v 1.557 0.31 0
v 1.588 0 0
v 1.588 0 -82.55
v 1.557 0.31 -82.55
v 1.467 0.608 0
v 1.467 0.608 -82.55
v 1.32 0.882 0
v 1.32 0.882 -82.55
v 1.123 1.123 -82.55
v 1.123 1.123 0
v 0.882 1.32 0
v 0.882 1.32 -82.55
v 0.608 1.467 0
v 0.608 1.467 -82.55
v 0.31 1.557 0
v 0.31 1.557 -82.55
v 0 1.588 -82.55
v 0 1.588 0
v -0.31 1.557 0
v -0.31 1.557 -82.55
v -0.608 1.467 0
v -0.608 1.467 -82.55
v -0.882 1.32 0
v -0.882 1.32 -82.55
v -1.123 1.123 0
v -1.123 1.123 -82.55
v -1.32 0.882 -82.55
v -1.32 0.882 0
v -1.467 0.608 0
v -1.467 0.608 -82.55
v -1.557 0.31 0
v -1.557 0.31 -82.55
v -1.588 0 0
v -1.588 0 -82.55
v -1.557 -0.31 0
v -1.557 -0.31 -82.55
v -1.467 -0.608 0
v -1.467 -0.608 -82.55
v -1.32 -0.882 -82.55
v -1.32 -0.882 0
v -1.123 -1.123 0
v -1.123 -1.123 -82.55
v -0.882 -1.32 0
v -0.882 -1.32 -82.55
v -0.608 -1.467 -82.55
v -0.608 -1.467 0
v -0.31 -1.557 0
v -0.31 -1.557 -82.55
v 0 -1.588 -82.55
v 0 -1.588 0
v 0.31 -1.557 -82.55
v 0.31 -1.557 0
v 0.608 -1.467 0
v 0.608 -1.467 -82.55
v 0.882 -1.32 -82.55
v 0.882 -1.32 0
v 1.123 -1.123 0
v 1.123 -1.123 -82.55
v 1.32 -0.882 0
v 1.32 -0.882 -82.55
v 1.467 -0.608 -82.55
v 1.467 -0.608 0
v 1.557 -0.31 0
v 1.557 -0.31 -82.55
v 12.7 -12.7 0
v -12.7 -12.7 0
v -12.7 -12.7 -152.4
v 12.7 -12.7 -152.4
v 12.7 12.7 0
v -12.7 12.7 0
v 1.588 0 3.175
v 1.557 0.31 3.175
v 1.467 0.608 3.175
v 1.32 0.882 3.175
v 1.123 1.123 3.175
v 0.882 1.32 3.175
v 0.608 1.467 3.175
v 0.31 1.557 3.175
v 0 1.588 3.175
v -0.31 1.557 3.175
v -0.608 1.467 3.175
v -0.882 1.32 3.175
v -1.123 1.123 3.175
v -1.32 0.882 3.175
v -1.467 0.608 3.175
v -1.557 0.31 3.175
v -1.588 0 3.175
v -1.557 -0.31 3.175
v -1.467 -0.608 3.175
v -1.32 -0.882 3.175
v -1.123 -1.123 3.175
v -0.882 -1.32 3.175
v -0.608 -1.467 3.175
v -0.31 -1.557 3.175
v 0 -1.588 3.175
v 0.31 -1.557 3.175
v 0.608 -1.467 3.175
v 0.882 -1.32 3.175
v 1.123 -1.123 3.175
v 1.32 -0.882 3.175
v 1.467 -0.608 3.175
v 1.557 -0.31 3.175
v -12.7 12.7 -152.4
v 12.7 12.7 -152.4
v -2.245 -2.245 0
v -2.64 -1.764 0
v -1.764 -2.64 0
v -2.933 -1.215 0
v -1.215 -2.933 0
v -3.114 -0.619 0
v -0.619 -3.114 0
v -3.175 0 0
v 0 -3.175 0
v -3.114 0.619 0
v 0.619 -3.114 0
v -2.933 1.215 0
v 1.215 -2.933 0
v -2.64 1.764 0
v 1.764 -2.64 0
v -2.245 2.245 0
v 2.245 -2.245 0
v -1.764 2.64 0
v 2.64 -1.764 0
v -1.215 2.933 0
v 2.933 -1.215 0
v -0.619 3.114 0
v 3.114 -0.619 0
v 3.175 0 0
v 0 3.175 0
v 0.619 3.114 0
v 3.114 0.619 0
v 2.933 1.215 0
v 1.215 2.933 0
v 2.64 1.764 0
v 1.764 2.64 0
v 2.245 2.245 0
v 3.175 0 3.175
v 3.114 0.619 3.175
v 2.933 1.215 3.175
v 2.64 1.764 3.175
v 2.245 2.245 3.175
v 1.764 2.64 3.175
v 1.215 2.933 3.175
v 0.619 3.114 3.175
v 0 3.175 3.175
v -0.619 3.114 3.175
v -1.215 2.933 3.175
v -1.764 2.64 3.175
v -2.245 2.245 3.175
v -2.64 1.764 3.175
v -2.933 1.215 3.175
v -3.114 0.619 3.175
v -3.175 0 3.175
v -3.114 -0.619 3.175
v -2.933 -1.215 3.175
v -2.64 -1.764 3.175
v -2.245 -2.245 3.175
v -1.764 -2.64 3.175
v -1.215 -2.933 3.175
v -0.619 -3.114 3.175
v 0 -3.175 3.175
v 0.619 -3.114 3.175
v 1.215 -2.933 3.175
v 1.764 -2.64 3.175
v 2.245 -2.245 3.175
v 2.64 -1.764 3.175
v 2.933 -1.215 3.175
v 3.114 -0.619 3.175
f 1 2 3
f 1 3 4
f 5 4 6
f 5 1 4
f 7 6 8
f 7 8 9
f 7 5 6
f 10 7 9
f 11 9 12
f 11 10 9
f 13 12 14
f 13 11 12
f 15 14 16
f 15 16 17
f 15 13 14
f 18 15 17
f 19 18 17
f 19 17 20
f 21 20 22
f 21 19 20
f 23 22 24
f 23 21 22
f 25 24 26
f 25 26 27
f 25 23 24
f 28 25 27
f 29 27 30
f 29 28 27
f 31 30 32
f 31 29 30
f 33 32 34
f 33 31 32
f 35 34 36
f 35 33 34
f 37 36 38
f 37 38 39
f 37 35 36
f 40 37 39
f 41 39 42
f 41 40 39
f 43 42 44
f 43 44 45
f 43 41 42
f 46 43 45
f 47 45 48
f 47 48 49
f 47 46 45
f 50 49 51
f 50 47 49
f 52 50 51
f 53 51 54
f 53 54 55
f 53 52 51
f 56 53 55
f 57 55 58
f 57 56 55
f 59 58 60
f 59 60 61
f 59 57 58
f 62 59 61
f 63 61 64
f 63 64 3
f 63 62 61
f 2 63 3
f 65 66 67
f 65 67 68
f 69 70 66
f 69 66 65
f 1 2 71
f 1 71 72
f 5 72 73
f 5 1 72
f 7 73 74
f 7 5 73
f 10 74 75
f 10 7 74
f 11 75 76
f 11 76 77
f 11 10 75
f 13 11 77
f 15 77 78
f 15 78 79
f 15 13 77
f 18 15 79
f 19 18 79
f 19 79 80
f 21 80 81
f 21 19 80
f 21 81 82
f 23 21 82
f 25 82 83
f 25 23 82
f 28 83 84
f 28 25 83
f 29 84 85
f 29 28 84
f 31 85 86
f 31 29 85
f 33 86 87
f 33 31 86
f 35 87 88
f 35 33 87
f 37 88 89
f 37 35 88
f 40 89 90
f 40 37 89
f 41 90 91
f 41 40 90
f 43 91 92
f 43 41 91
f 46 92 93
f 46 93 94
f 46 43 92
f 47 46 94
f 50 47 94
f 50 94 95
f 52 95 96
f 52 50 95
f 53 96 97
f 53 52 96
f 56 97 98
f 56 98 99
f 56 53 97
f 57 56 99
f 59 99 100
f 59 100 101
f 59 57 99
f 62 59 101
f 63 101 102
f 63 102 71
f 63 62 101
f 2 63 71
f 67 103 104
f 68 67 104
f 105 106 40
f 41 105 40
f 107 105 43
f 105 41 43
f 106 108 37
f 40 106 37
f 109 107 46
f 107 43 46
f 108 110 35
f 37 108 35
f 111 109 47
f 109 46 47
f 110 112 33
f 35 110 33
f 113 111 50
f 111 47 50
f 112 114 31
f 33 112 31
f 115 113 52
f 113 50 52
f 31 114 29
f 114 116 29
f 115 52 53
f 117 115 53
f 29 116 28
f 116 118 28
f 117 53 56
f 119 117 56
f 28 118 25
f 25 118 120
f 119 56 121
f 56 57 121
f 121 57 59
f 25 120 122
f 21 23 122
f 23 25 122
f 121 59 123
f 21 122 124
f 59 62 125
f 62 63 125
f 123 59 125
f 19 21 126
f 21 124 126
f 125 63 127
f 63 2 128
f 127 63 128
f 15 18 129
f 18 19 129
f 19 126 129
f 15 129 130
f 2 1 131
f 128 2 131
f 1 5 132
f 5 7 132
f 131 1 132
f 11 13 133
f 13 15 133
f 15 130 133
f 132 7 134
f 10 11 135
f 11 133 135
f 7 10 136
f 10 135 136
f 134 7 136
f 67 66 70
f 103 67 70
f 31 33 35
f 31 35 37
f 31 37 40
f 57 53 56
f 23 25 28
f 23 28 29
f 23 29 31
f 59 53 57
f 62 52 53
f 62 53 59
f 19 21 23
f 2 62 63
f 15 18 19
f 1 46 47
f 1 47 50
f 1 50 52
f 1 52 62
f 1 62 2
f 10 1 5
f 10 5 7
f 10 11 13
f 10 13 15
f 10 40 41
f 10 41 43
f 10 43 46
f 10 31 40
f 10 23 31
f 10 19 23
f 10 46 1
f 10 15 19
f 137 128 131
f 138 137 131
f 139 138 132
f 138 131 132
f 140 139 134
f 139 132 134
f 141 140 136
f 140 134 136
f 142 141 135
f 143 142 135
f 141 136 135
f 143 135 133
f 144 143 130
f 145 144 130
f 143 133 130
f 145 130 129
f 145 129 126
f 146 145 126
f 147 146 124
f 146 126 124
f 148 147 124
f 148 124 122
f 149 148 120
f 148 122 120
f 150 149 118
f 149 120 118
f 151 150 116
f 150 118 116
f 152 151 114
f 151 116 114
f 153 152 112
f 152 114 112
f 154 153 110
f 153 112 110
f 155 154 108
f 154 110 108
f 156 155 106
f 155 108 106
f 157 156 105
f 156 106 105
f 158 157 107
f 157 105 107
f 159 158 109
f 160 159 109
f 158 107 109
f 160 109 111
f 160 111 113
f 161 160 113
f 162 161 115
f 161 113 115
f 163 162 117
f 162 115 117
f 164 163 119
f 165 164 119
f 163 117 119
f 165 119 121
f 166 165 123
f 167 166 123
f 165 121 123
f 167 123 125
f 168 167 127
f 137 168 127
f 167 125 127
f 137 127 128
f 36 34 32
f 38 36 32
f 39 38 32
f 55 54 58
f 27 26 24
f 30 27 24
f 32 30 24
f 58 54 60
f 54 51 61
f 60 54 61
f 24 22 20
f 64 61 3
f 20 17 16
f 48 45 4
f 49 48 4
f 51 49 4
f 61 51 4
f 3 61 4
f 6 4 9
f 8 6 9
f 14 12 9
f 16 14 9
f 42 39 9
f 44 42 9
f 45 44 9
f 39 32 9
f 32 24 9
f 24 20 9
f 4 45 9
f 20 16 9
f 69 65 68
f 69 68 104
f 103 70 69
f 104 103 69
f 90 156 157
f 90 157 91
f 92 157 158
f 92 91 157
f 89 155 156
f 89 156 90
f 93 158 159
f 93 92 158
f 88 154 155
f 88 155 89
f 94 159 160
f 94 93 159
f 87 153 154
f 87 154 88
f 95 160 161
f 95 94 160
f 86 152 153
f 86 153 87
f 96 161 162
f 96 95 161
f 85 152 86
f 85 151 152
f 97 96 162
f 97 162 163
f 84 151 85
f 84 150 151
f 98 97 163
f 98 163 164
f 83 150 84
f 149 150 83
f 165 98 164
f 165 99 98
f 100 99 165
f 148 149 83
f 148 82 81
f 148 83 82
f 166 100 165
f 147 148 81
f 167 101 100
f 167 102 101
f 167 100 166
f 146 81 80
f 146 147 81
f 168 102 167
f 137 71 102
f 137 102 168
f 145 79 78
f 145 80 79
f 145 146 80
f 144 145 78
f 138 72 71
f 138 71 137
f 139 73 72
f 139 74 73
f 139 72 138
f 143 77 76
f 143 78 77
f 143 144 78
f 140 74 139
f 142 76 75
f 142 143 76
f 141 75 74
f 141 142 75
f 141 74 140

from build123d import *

# Parameters (mm, degrees)
F0_R     = 1.5875
F1_DEPTH = 82.55
F2_R     = 3.175
F2_R_2   = 1.5875
F3_DEPTH = 3.175
F4_W     = 25.4
F4_H     = 25.4
F5_DEPTH = 152.4


with BuildPart() as f1:
    # F0 (on Top) → F1 (new body)
    with BuildSketch(Plane.XY):
        Circle(F0_R)
    extrude(amount=-F1_DEPTH)


with BuildPart() as f3:
    # F2 (on Top) → F3 (new body)
    with BuildSketch(Plane.XY):
        Circle(F2_R)
        Circle(F2_R_2, mode=Mode.SUBTRACT)
    extrude(amount=F3_DEPTH)


with BuildPart() as f5:
    # F4 (on Top) → F5 (new body)
    with BuildSketch(Plane.XY):
        Rectangle(F4_W, F4_H)
    extrude(amount=-F5_DEPTH)


solid = Compound([f1.part, f3.part, f5.part])
